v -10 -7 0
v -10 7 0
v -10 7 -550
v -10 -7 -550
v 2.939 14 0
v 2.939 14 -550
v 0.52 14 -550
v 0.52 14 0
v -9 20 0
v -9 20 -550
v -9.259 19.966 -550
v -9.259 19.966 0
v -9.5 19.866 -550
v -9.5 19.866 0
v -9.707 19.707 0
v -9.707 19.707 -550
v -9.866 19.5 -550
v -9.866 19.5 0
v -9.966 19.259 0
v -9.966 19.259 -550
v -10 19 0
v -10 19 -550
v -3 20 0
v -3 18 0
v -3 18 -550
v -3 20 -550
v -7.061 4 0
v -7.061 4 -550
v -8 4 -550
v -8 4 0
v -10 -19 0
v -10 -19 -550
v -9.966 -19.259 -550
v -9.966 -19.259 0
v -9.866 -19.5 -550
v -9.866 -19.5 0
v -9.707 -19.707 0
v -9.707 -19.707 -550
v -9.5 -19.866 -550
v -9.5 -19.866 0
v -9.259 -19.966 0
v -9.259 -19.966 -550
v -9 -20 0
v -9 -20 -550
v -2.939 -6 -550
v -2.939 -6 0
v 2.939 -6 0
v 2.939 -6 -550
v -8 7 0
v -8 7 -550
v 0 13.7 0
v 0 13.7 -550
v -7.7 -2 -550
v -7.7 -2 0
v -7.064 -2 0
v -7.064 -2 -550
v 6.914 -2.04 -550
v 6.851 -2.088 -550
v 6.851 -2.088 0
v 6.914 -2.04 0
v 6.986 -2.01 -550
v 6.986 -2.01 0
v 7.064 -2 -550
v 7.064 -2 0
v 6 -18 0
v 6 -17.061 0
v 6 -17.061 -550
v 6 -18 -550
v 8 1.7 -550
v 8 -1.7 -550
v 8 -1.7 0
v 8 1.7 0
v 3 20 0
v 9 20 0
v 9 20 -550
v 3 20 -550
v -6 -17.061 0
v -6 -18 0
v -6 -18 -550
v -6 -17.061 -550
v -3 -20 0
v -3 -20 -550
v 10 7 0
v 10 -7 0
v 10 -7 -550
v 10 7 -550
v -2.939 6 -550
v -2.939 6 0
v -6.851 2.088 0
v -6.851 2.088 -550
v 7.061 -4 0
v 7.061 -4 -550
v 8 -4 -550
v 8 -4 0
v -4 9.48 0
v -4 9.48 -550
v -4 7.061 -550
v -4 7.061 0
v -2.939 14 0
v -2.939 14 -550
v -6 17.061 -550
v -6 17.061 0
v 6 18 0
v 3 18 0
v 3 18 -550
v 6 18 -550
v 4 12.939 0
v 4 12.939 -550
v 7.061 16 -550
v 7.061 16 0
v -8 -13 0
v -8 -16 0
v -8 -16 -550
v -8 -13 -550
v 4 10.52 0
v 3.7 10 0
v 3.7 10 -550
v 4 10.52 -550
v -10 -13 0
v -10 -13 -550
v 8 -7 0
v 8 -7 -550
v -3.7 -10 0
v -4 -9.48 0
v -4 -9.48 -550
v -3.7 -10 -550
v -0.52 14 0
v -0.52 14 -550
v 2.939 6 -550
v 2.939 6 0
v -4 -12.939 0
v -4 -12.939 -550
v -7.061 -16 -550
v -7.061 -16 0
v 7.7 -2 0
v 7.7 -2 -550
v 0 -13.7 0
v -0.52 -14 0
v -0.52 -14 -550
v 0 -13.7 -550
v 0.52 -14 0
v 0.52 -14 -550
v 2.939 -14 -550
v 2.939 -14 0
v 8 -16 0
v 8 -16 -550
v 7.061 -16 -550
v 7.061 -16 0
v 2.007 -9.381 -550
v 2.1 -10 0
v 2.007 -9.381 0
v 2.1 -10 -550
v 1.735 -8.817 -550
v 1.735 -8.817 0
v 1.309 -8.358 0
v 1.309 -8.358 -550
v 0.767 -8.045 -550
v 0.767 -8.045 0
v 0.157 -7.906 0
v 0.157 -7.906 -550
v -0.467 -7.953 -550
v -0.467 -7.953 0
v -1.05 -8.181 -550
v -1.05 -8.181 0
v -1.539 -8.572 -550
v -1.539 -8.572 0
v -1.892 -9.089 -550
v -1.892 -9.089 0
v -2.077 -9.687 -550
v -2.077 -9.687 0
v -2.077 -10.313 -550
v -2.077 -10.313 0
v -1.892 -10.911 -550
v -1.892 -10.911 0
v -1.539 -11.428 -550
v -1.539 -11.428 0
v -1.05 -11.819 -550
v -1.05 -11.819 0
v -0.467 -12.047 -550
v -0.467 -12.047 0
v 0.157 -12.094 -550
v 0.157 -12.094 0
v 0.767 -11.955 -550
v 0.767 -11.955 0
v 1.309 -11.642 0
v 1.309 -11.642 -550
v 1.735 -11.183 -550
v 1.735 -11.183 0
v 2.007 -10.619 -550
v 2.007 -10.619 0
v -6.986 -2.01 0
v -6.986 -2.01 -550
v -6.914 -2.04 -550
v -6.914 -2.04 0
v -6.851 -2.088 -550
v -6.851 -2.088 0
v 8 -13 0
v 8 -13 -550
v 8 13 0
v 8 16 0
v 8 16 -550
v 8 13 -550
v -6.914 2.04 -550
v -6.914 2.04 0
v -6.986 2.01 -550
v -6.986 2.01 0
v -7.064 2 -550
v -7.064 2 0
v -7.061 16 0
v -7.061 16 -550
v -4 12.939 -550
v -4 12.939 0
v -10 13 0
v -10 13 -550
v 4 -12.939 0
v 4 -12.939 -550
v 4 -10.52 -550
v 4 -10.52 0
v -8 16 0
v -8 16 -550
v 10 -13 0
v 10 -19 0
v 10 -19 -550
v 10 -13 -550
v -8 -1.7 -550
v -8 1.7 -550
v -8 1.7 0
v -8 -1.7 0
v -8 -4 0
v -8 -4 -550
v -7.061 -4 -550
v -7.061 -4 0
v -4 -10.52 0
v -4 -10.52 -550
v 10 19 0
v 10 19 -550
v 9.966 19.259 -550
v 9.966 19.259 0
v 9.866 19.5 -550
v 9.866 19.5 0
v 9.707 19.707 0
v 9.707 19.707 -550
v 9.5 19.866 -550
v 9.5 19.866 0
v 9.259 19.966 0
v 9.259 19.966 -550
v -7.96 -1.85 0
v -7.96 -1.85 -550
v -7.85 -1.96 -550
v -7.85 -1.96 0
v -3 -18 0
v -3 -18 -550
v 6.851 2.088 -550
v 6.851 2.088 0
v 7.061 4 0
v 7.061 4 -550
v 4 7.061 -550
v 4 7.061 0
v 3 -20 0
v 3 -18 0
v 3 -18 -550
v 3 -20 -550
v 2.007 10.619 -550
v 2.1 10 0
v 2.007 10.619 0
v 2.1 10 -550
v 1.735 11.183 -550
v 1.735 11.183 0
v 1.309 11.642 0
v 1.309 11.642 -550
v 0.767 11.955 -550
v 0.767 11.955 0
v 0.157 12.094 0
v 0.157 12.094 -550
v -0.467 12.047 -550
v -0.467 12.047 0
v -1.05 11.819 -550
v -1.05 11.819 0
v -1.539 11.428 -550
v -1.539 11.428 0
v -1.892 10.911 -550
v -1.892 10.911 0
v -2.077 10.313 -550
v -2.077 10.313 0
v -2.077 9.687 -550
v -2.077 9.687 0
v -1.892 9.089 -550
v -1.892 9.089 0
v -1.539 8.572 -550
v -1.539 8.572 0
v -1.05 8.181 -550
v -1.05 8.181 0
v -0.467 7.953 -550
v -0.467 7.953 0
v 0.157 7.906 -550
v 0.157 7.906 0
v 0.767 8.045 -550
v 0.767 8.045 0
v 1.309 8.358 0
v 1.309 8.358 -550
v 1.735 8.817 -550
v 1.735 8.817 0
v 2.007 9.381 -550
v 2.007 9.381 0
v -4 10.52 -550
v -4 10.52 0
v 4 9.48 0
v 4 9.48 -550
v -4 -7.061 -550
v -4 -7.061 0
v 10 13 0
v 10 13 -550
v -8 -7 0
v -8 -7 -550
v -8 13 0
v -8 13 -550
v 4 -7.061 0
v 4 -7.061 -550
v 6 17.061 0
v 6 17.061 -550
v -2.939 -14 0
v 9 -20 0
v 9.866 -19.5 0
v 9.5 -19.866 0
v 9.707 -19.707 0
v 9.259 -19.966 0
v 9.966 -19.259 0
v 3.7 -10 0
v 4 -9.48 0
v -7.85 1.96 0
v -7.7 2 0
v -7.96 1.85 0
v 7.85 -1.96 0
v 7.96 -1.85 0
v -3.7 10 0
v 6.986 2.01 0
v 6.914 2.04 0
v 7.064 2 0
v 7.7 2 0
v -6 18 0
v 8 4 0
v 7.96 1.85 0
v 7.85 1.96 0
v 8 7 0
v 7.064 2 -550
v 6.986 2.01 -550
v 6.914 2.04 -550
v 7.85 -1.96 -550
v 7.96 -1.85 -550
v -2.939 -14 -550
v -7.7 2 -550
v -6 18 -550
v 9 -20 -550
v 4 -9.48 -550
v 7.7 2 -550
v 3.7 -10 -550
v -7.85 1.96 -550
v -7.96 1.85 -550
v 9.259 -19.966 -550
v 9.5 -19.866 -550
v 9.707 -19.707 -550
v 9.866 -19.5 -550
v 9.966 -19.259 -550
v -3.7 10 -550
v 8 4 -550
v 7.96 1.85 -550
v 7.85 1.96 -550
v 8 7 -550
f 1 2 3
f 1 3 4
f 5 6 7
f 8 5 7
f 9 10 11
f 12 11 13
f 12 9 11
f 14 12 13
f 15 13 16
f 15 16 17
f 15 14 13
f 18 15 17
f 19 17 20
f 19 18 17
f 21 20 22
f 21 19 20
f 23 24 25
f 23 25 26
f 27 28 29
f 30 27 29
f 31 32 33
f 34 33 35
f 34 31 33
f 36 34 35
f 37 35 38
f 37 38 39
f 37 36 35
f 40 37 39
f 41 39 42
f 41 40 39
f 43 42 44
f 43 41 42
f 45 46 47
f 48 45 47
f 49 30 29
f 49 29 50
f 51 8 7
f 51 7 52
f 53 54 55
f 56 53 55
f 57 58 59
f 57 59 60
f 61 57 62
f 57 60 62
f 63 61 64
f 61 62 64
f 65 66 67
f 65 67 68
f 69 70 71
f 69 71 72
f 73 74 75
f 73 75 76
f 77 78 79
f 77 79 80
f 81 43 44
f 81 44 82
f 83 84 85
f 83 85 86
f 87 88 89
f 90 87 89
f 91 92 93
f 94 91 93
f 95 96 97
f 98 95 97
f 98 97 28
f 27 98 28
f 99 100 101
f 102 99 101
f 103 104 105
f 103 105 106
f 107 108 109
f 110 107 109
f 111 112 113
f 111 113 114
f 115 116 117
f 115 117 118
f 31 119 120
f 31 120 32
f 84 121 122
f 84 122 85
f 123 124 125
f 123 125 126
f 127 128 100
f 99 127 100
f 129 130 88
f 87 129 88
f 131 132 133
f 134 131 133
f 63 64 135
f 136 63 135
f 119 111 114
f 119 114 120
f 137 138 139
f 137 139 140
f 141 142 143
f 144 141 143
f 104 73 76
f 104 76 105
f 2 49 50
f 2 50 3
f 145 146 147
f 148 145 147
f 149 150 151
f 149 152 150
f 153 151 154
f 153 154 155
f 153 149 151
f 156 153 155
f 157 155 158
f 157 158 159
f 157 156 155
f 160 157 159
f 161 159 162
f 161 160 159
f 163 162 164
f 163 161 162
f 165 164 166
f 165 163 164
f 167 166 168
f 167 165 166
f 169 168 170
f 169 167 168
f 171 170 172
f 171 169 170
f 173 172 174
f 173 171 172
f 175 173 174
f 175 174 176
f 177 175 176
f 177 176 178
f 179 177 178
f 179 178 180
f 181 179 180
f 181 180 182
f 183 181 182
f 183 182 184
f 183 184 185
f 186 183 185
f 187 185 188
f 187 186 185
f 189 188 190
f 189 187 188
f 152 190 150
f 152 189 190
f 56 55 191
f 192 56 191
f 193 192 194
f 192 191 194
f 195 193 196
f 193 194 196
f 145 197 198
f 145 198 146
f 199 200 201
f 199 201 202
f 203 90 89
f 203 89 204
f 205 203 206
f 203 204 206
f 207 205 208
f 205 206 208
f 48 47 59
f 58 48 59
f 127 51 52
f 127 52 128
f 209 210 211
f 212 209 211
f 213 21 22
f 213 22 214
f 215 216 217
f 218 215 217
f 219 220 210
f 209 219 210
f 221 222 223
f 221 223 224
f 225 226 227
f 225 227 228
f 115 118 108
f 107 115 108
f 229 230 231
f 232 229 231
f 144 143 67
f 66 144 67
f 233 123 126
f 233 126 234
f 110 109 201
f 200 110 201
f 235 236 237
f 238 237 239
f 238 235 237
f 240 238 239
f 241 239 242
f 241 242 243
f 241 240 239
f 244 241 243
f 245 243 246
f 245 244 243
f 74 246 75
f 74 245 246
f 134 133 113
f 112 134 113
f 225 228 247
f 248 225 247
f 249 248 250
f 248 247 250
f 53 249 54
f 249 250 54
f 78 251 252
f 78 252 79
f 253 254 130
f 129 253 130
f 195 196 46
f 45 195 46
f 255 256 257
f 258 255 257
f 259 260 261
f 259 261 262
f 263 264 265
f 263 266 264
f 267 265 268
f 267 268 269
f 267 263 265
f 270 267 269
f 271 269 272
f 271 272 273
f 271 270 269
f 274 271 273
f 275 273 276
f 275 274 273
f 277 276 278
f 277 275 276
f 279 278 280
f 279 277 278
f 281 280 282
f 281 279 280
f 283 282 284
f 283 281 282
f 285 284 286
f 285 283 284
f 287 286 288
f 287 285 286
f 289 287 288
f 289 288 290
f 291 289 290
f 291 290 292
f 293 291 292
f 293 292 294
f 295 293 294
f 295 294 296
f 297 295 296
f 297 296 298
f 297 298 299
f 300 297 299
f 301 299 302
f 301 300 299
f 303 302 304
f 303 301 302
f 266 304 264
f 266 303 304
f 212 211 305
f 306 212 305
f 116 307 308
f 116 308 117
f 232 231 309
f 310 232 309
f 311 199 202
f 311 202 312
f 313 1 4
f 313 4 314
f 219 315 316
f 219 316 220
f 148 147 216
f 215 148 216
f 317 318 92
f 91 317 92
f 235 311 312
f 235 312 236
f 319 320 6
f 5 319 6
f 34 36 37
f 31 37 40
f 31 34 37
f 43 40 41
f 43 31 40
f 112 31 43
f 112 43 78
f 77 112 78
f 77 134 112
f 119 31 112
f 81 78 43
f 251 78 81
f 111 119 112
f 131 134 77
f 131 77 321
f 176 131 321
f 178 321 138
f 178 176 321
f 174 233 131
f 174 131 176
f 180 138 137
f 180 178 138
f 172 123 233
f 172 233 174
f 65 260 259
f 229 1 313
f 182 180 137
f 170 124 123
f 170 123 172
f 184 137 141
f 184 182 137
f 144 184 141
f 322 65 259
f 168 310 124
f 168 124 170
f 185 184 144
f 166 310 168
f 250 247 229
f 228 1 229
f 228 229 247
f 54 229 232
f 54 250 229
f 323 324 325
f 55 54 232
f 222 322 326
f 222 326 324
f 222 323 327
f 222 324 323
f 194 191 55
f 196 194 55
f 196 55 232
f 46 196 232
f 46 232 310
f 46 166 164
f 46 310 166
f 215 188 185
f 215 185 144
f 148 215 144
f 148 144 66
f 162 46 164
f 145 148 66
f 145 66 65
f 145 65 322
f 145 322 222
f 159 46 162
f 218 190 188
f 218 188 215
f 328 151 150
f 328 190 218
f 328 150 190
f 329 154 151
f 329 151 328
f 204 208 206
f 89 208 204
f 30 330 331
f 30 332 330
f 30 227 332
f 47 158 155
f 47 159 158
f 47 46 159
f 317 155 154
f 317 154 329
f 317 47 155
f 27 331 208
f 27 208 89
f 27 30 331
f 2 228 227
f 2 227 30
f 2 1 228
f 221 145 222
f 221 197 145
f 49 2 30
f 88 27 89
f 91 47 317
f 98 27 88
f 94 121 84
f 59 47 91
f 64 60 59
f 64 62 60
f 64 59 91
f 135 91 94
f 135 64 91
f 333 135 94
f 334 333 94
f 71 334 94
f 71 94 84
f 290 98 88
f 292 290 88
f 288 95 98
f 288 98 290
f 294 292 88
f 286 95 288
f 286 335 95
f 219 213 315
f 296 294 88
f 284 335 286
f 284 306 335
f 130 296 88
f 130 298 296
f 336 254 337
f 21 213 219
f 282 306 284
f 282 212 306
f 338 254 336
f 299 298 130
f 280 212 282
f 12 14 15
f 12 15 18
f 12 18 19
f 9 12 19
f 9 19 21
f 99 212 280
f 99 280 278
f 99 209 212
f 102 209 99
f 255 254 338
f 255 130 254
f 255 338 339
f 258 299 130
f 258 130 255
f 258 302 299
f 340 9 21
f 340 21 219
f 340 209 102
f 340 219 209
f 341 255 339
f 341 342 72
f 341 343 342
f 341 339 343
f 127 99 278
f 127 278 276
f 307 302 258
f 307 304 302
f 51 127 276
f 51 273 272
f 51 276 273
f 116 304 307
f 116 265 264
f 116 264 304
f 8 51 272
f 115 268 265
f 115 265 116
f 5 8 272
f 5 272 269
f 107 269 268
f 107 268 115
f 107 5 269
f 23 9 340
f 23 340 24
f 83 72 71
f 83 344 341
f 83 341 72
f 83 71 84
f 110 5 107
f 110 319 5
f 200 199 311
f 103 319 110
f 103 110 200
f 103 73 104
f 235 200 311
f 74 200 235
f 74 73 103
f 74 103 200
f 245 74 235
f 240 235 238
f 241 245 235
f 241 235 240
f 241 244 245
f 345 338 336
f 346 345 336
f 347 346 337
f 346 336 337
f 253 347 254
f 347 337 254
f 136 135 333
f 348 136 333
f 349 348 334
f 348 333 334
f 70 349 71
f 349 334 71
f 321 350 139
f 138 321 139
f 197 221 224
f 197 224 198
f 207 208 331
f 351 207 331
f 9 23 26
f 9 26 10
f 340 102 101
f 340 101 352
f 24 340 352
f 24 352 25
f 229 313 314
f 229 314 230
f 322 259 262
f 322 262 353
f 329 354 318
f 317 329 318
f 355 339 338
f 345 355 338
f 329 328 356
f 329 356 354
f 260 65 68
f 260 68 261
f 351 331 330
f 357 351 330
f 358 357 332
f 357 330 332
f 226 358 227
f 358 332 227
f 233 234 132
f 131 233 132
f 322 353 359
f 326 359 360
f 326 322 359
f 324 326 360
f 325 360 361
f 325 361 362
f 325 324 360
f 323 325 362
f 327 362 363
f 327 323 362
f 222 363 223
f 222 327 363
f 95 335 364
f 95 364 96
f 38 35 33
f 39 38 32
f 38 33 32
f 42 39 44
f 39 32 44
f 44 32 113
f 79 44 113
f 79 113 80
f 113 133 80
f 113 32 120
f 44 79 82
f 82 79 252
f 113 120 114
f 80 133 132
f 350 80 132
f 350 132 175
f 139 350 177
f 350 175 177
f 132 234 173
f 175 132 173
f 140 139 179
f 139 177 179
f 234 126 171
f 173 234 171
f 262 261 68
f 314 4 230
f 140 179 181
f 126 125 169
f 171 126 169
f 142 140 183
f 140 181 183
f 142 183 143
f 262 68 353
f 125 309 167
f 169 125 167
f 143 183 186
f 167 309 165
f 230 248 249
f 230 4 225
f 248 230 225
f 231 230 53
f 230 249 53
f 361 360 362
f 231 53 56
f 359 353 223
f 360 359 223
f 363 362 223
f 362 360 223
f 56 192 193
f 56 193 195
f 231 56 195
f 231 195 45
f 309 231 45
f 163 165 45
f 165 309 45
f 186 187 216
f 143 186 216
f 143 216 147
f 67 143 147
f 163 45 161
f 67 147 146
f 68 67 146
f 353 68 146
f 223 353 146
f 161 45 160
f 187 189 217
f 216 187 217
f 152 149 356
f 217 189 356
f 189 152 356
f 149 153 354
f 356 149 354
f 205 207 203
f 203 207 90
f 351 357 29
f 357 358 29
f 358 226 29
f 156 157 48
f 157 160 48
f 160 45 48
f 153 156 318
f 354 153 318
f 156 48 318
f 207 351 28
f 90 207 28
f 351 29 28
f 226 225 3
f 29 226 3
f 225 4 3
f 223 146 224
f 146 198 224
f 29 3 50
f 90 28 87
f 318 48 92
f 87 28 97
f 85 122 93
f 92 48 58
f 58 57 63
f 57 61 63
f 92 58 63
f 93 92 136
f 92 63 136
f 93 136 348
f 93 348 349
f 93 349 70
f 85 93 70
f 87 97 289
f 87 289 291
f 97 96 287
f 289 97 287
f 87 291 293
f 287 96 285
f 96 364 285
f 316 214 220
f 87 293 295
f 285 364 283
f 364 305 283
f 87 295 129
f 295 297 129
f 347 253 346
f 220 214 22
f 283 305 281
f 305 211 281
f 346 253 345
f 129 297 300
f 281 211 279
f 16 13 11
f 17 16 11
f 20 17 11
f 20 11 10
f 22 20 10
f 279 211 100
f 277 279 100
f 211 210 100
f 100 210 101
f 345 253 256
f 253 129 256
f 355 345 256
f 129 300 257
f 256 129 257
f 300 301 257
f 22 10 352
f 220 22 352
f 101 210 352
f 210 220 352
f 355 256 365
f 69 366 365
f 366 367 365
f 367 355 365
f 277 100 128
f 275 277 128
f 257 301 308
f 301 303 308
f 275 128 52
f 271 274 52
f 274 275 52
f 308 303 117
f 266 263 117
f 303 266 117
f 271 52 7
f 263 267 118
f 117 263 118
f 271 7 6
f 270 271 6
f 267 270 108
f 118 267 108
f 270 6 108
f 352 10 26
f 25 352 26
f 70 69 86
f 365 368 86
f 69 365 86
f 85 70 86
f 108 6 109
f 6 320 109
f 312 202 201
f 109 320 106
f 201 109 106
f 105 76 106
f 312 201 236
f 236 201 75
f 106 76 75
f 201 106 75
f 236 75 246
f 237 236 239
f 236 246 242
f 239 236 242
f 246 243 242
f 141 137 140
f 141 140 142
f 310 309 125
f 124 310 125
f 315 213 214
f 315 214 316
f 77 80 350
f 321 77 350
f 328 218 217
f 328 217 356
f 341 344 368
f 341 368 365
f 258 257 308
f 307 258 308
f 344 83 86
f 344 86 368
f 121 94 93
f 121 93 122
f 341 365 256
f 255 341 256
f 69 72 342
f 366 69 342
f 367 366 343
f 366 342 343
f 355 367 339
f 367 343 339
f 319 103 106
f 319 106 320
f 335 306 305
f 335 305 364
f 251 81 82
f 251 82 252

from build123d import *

# Parameters (mm, degrees)
BOSS_EXTRUDE1_DEPTH = 550
SKETCH2_W           = 550
SKETCH2_H           = 2.1
SKETCH3_W           = 550
SKETCH3_H           = 2.1


with BuildPart() as part:
    # Sketch1 → Boss-Extrude1 (new body)
    with BuildSketch(Plane.XY):
        with BuildLine():
            Line((-10, -7), (-8, -7))
            Line((-8, -7), (-8, -4))
            Line((-8, -4), (-7.060660172, -4))
            Line((-7.060660172, -4), (-4, -7.060660172))
            Line((-4, -7.060660172), (-4, -9.480384758))
            Line((-4, -9.480384758), (-3.7, -10))
            Line((-3.7, -10), (-4, -10.519615242))
            Line((-4, -10.519615242), (-4, -12.939339828))
            Line((-4, -12.939339828), (-7.060660172, -16))
            Line((-7.060660172, -16), (-8, -16))
            Line((-8, -16), (-8, -13))
            Line((-8, -13), (-10, -13))
            Line((-10, -13), (-10, -19))
            ThreePointArc((-10, -19), (-9.707106781, -19.707106781), (-9, -20))
            Line((-9, -20), (-3, -20))
            Line((-3, -20), (-3, -18))
            Line((-3, -18), (-6, -18))
            Line((-6, -18), (-6, -17.060660172))
            Line((-6, -17.060660172), (-2.939339828, -14))
            Line((-2.939339828, -14), (-0.519615242, -14))
            Line((-0.519615242, -14), (0, -13.7))
            Line((0, -13.7), (0.519615242, -14))
            Line((0.519615242, -14), (2.939339828, -14))
            Line((2.939339828, -14), (6, -17.060660172))
            Line((6, -17.060660172), (6, -18))
            Line((6, -18), (3, -18))
            Line((3, -18), (3, -20))
            Line((3, -20), (9, -20))
            ThreePointArc((9, -20), (9.707106781, -19.707106781), (10, -19))
            Line((10, -19), (10, -13))
            Line((10, -13), (8, -13))
            Line((8, -13), (8, -16))
            Line((8, -16), (7.060660172, -16))
            Line((7.060660172, -16), (4, -12.939339828))
            Line((4, -12.939339828), (4, -10.519615242))
            Line((4, -10.519615242), (3.7, -10))
            Line((3.7, -10), (4, -9.480384758))
            Line((4, -9.480384758), (4, -7.060660172))
            Line((4, -7.060660172), (7.060660172, -4))
            Line((7.060660172, -4), (8, -4))
            Line((8, -4), (8, -7))
            Line((8, -7), (10, -7))
            Line((10, -7), (10, 7))
            Line((10, 7), (8, 7))
            Line((8, 7), (8, 4))
            Line((8, 4), (7.060660172, 4))
            Line((7.060660172, 4), (4, 7.060660172))
            Line((4, 7.060660172), (4, 9.480384758))
            Line((4, 9.480384758), (3.7, 10))
            Line((3.7, 10), (4, 10.519615242))
            Line((4, 10.519615242), (4, 12.939339828))
            Line((4, 12.939339828), (7.060660172, 16))
            Line((7.060660172, 16), (8, 16))
            Line((8, 16), (8, 13))
            Line((8, 13), (10, 13))
            Line((10, 13), (10, 19))
            ThreePointArc((10, 19), (9.707106781, 19.707106781), (9, 20))
            Line((9, 20), (3, 20))
            Line((3, 20), (3, 18))
            Line((3, 18), (6, 18))
            Line((6, 18), (6, 17.060660172))
            Line((6, 17.060660172), (2.939339828, 14))
            Line((2.939339828, 14), (0.519615242, 14))
            Line((0.519615242, 14), (0, 13.7))
            Line((0, 13.7), (-0.519615242, 14))
            Line((-0.519615242, 14), (-2.939339828, 14))
            Line((-2.939339828, 14), (-6, 17.060660172))
            Line((-6, 17.060660172), (-6, 18))
            Line((-6, 18), (-3, 18))
            Line((-3, 18), (-3, 20))
            Line((-3, 20), (-9, 20))
            ThreePointArc((-9, 20), (-9.707106781, 19.707106781), (-10, 19))
            Line((-10, 19), (-10, 13))
            Line((-10, 13), (-8, 13))
            Line((-8, 13), (-8, 16))
            Line((-8, 16), (-7.060660172, 16))
            Line((-7.060660172, 16), (-4, 12.939339828))
            Line((-4, 12.939339828), (-4, 10.519615242))
            Line((-4, 10.519615242), (-3.7, 10))
            Line((-3.7, 10), (-4, 9.480384758))
            Line((-4, 9.480384758), (-4, 7.060660172))
            Line((-4, 7.060660172), (-7.060660172, 4))
            Line((-7.060660172, 4), (-8, 4))
            Line((-8, 4), (-8, 7))
            Line((-8, 7), (-10, 7))
            Line((-10, 7), (-10, -7))
        make_face()
        with BuildLine():
            Line((-8, 1.7), (-8, -1.7))
            ThreePointArc((-8, -1.7), (-7.912132034, -1.912132034), (-7.7, -2))
            Line((-7.7, -2), (-7.063603897, -2))
            ThreePointArc((-7.063603897, -2), (-6.948798867, -2.02283614), (-6.851471863, -2.087867966))
            Line((-6.851471863, -2.087867966), (-2.939339828, -6))
            Line((-2.939339828, -6), (2.939339828, -6))
            Line((2.939339828, -6), (6.851471863, -2.087867966))
            ThreePointArc((6.851471863, -2.087867966), (6.948798867, -2.02283614), (7.063603897, -2))
            Line((7.063603897, -2), (7.7, -2))
            ThreePointArc((7.7, -2), (7.912132034, -1.912132034), (8, -1.7))
            Line((8, -1.7), (8, 1.7))
            ThreePointArc((8, 1.7), (7.912132034, 1.912132034), (7.7, 2))
            Line((7.7, 2), (7.063603897, 2))
            ThreePointArc((7.063603897, 2), (6.948798867, 2.02283614), (6.851471863, 2.087867966))
            Line((6.851471863, 2.087867966), (2.939339828, 6))
            Line((2.939339828, 6), (-2.939339828, 6))
            Line((-2.939339828, 6), (-6.851471863, 2.087867966))
            ThreePointArc((-6.851471863, 2.087867966), (-6.948798867, 2.02283614), (-7.063603897, 2))
            Line((-7.063603897, 2), (-7.7, 2))
            ThreePointArc((-7.7, 2), (-7.912132034, 1.912132034), (-8, 1.7))
        make_face(mode=Mode.SUBTRACT)
    extrude(amount=-BOSS_EXTRUDE1_DEPTH)

    # Sketch2 → Cut-Revolve1 (revolve, cut)
    with BuildSketch(Plane(origin=(0, 0, 0), x_dir=(0, 0, -1), z_dir=(1, 0, 0)), mode=Mode.PRIVATE) as cut_revolve1_sk:
        with Locations((275, 11.05)):
            Rectangle(SKETCH2_W, SKETCH2_H)
    revolve(cut_revolve1_sk.sketch.rotate(Axis((0, 10, -550), (0, 0, 1)), 270), axis=Axis((0, 10, -550), (0, 0, 1)), mode=Mode.SUBTRACT)

    # Sketch3 → Cut-Revolve2 (revolve, cut)
    with BuildSketch(Plane(origin=(0, 0, 0), x_dir=(0, 0, -1), z_dir=(1, 0, 0)), mode=Mode.PRIVATE) as cut_revolve2_sk:
        with Locations((275, -8.95)):
            Rectangle(SKETCH3_W, SKETCH3_H)
    revolve(cut_revolve2_sk.sketch.rotate(Axis((0, -10, -550), (0, 0, 1)), 270), axis=Axis((0, -10, -550), (0, 0, 1)), mode=Mode.SUBTRACT)


solid = part.part
